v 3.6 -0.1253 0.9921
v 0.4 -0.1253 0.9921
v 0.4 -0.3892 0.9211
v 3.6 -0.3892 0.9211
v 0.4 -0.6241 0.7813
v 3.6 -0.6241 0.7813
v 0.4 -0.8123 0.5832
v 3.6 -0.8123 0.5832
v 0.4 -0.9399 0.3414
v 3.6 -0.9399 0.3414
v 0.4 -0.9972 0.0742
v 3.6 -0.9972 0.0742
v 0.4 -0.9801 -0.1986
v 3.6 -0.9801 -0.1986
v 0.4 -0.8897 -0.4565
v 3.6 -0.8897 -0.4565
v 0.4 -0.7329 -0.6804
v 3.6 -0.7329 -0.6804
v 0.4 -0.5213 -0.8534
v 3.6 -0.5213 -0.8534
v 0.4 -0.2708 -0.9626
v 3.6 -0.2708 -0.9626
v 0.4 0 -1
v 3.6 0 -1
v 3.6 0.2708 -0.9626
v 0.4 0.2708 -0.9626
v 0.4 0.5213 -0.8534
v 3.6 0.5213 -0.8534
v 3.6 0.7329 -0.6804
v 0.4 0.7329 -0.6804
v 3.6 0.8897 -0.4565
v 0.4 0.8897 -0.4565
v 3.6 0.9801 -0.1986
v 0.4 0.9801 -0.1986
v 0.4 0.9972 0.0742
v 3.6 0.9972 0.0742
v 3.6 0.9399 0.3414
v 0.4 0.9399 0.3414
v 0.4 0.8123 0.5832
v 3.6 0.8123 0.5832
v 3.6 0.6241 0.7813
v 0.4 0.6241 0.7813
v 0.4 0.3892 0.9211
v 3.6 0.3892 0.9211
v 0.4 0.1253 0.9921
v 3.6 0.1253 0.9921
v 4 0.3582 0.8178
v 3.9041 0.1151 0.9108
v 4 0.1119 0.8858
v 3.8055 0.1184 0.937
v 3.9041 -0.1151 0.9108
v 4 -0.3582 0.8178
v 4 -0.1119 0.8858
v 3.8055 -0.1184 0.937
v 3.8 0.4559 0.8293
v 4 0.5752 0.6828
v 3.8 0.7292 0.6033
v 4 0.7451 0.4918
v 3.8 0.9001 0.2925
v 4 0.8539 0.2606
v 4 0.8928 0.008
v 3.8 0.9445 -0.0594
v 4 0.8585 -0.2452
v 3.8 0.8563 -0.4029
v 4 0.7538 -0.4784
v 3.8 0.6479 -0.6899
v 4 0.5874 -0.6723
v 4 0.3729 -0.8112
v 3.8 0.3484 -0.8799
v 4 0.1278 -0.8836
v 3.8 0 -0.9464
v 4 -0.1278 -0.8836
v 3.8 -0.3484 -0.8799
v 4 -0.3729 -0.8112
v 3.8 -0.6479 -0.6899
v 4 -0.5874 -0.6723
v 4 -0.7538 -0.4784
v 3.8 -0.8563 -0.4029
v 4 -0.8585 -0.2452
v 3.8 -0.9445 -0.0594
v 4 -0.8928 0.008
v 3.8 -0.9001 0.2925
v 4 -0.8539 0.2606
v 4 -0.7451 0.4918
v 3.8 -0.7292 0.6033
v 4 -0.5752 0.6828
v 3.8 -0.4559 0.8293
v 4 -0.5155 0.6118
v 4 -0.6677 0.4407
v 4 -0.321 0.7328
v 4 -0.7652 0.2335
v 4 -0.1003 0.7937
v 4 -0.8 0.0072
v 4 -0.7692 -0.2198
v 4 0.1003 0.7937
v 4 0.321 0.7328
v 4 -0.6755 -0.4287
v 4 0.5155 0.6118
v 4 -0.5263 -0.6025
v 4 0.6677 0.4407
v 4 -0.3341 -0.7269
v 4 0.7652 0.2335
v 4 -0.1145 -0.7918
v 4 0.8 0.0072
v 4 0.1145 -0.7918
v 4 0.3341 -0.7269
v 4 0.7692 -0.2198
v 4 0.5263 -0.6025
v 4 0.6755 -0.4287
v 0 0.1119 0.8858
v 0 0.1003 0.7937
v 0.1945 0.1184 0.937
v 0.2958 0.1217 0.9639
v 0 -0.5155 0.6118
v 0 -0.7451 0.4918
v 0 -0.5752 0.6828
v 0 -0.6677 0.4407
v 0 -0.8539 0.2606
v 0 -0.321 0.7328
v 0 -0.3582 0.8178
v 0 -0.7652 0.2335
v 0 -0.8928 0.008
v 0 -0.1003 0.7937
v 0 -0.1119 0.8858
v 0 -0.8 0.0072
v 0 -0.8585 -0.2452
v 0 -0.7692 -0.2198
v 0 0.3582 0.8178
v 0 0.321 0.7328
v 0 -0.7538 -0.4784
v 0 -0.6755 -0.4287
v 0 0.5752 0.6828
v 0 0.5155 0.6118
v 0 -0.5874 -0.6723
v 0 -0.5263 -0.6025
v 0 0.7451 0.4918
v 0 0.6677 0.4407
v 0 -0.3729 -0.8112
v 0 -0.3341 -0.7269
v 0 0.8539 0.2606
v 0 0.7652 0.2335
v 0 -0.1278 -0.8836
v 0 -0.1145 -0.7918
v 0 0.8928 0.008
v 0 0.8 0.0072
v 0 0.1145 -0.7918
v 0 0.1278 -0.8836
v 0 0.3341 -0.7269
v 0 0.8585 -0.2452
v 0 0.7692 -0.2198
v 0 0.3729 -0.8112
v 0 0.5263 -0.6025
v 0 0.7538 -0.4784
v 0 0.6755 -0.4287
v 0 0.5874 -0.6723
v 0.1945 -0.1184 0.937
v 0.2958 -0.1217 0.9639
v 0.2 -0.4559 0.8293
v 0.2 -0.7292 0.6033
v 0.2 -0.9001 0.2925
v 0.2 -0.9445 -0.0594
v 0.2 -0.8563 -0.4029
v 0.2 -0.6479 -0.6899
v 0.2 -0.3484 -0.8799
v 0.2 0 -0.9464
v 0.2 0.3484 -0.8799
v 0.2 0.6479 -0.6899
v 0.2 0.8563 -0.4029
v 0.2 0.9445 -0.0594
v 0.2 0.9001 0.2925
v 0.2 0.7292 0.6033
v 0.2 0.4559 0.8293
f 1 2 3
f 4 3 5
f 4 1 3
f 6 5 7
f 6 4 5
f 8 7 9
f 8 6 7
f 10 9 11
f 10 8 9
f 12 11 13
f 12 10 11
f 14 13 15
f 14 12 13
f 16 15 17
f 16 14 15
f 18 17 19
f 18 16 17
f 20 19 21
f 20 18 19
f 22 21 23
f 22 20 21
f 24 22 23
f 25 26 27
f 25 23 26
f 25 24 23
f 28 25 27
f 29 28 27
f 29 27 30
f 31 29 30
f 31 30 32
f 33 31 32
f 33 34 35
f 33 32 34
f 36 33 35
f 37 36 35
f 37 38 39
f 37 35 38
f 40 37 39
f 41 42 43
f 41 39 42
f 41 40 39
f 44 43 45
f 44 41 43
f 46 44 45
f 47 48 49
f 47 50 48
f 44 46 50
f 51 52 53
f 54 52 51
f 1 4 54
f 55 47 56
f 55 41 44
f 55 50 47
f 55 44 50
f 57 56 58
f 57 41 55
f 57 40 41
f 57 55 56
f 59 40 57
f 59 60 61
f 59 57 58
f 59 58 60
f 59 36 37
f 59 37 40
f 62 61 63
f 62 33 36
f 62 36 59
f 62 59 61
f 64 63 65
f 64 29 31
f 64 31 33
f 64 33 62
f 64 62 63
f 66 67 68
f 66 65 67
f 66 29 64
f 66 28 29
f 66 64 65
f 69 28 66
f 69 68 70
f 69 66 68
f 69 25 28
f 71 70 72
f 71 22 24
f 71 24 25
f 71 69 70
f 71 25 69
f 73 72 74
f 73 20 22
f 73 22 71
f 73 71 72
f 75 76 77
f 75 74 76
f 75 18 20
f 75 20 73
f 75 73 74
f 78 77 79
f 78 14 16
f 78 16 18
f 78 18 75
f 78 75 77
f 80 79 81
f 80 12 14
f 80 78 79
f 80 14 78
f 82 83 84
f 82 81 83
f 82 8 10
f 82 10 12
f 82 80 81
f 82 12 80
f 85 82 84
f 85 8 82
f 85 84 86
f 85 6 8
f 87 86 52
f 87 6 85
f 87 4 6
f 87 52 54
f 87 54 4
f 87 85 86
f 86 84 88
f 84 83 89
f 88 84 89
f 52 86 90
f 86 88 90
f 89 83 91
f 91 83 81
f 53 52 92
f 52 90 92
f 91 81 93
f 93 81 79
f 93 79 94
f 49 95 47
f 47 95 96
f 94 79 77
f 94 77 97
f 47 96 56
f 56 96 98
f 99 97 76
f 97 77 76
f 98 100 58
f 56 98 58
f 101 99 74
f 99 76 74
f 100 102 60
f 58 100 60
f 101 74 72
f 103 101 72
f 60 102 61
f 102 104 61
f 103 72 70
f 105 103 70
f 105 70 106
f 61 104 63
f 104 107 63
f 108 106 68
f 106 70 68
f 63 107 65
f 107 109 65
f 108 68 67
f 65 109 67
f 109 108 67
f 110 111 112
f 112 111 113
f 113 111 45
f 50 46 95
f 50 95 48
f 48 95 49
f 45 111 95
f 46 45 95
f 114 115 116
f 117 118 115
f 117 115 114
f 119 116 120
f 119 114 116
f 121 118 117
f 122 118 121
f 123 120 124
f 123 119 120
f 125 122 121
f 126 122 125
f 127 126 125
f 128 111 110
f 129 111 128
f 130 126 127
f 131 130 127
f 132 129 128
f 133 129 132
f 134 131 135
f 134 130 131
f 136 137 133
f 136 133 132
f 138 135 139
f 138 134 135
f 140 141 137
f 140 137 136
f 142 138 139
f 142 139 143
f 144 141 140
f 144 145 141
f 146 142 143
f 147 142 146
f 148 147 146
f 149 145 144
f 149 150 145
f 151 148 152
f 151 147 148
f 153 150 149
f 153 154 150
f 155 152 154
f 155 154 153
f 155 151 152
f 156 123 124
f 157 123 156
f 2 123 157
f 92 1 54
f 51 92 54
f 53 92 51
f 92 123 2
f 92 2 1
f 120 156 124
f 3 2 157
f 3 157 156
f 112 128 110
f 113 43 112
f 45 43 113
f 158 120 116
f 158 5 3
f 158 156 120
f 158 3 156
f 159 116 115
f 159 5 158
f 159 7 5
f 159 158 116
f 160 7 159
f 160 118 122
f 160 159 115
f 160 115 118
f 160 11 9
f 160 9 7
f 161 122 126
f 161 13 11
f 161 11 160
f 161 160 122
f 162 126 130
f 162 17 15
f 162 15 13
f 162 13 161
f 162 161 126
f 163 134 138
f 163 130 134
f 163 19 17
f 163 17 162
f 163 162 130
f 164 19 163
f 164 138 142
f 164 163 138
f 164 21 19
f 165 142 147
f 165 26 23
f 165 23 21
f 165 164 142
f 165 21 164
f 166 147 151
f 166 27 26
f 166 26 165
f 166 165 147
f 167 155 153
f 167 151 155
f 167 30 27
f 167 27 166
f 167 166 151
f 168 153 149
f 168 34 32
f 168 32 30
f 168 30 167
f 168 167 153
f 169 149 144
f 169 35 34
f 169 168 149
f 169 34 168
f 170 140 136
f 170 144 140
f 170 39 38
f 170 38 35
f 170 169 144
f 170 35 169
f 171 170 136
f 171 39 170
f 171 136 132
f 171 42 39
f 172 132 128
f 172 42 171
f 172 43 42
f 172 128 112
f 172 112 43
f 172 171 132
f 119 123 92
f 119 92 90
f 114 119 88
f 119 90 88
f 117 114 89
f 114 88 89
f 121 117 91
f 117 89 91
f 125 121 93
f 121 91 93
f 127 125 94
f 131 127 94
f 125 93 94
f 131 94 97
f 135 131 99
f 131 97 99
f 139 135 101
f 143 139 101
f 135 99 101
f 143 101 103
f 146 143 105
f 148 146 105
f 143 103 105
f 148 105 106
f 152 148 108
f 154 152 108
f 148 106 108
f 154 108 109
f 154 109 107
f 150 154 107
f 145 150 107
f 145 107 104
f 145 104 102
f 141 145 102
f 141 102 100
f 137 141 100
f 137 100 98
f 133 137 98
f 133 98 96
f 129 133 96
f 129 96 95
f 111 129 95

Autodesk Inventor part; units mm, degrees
ref_plane "YZ Plane" through (0, 0, 0) normal (1, 0, 0) x (0, 1, 0)
ref_plane "XZ Plane" through (0, 0, 0) normal (0, 1, 0) x (-1, 0, 0)
sketch "Skizze1" plane through (0, 0, 0) normal (0, 0, 1) x (1, 0, 0)
  line L0 (0, 0.8) -> (0, 0.8928)
  line L1 (0, 0.8928) -> (0.4, 1)
  line L2 (0.4, 1) -> (3.6, 1)
  line L3 (3.6, 1) -> (4, 0.8928)
  line L4 (4, 0.8928) -> (4, 0.8)
  line L5 (4, 0) -> (0, 0)
  line L6 (0, 0.8) -> (4, 0.8)
  line L7 (0, 0.8) -> (0, 0) construction
  line L8 (4, 0.8) -> (4, 0) construction
  line L9 (0, 1.5) -> (0, -0.25) projected
  line L10 (-2, 0) -> (12, 0) projected
  dimension "d0" = 4
  dimension "d1" = 2
  dimension "d2" = 1.6
  dimension "d3" = 15
  dimension "d4" = 15
  dimension "d7" = 0.1072
  dimension "d8" = 0.1072
revolve "Körper" add sketch "Skizze1" angle 360 about axis through (4, 0, 0) along (-1, 0, 0)
ref_plane "Work Plane1" through (2, 0, 0) normal (1, 0, 0) x (0, 1, 0)
sketch "Skizze2" plane through (2, 0, 0) normal (1, 0, 0) x (0, 1, 0)
  arc A0 (0.1253, 0.9921) -> (-0.1253, 0.9921) centre (0, 0) ccw
  arc A1 (0.1003, 0.7937) -> (-0.1003, 0.7937) centre (0, 0) ccw
  line L0 (-0.1003, 0.7937) -> (-0.1253, 0.9921)
  line L1 (0.1003, 0.7937) -> (0.1253, 0.9921)
  line L2 (0, 1.5) -> (0, -0.25) projected
  line L3 (-0.2193, 0) -> (0.2193, 0) projected
  dimension "d11" = 1
  dimension "d12" = 0.8
  dimension "d14" = 0.2
  dimension "d15" = 7.2
extrude "Schnitt" cut sketch "Skizze2" against normal mid plane 4
equation "\"d0\" = NLG"
equation "\"d1\" = NND"
equation "\"d2\" = NND - 2 * SD"
equation "\"d3\" = FAWI"
equation "\"d4\" = FAWI"
equation "\"d11\" = 0.5 * NND"
equation "\"d12\" = -SD + 0.5 * NND"
equation "\"d14\" = SD"
equation "\"d5\" = NLG"
equation "\"NND\" = 2"
equation "\"NLG\" = 4"
equation "\"SD\" = 0.2"
equation "\"PHH\" = 0.4"
equation "\"PHH1\" = PHH"
equation "\"FAWI\" = 15deg"
equation "\"d9\" = 0.5 * NLG"
equation "\"NND1\" = 2.4"
properties part number "ISO 13337 - 2 x 4" material "Edelstahl, austenitisch"
